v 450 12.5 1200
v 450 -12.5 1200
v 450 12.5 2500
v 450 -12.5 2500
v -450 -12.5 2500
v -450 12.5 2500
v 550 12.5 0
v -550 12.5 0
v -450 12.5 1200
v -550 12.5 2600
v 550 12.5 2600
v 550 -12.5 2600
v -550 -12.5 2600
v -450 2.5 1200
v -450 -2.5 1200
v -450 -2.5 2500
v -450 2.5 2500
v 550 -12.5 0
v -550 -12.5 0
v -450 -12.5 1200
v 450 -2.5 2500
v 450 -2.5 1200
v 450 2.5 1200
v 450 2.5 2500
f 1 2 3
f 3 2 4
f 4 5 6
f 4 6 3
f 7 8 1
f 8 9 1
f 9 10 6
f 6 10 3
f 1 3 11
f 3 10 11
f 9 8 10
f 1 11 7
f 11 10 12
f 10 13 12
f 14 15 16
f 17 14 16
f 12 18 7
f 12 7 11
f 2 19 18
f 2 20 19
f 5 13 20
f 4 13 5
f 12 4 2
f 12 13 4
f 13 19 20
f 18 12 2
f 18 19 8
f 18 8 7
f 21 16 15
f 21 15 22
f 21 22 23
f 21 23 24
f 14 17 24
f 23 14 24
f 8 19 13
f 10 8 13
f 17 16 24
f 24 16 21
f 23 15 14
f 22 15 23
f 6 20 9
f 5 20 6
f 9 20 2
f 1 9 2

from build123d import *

# Parameters (mm, degrees)
F0_W          = 1100
F0_H          = 2600
F1_DEPTH      = 12.5
F2_W          = 900
F2_H          = 1300
F3_DEPTH      = 12.501
F3_DEPTH_BACK = 12.501
F4_W          = 900
F4_H          = 1300
F5_DEPTH      = 2.5


with BuildPart() as f1:
    # F0 (on Front) → F1 (new body, symmetric)
    with BuildSketch(Plane.XZ):
        with Locations((0, 1300)):
            Rectangle(F0_W, F0_H)
    extrude(amount=F1_DEPTH, both=True)

    # F2 (on Front) → F3 (cut, two sides)
    with BuildSketch(Plane.XZ) as f3_sk:
        with Locations((0, 1850)):
            Rectangle(F2_W, F2_H)
    extrude(amount=-F3_DEPTH, mode=Mode.SUBTRACT)
    extrude(f3_sk.sketch, amount=F3_DEPTH_BACK, mode=Mode.SUBTRACT)


with BuildPart() as f5:
    # F4 (on Front) → F5 (new body, symmetric)
    with BuildSketch(Plane.XZ):
        with Locations((0, 1850)):
            Rectangle(F4_W, F4_H)
    extrude(amount=F5_DEPTH, both=True)


solid = Compound([f1.part, f5.part])
